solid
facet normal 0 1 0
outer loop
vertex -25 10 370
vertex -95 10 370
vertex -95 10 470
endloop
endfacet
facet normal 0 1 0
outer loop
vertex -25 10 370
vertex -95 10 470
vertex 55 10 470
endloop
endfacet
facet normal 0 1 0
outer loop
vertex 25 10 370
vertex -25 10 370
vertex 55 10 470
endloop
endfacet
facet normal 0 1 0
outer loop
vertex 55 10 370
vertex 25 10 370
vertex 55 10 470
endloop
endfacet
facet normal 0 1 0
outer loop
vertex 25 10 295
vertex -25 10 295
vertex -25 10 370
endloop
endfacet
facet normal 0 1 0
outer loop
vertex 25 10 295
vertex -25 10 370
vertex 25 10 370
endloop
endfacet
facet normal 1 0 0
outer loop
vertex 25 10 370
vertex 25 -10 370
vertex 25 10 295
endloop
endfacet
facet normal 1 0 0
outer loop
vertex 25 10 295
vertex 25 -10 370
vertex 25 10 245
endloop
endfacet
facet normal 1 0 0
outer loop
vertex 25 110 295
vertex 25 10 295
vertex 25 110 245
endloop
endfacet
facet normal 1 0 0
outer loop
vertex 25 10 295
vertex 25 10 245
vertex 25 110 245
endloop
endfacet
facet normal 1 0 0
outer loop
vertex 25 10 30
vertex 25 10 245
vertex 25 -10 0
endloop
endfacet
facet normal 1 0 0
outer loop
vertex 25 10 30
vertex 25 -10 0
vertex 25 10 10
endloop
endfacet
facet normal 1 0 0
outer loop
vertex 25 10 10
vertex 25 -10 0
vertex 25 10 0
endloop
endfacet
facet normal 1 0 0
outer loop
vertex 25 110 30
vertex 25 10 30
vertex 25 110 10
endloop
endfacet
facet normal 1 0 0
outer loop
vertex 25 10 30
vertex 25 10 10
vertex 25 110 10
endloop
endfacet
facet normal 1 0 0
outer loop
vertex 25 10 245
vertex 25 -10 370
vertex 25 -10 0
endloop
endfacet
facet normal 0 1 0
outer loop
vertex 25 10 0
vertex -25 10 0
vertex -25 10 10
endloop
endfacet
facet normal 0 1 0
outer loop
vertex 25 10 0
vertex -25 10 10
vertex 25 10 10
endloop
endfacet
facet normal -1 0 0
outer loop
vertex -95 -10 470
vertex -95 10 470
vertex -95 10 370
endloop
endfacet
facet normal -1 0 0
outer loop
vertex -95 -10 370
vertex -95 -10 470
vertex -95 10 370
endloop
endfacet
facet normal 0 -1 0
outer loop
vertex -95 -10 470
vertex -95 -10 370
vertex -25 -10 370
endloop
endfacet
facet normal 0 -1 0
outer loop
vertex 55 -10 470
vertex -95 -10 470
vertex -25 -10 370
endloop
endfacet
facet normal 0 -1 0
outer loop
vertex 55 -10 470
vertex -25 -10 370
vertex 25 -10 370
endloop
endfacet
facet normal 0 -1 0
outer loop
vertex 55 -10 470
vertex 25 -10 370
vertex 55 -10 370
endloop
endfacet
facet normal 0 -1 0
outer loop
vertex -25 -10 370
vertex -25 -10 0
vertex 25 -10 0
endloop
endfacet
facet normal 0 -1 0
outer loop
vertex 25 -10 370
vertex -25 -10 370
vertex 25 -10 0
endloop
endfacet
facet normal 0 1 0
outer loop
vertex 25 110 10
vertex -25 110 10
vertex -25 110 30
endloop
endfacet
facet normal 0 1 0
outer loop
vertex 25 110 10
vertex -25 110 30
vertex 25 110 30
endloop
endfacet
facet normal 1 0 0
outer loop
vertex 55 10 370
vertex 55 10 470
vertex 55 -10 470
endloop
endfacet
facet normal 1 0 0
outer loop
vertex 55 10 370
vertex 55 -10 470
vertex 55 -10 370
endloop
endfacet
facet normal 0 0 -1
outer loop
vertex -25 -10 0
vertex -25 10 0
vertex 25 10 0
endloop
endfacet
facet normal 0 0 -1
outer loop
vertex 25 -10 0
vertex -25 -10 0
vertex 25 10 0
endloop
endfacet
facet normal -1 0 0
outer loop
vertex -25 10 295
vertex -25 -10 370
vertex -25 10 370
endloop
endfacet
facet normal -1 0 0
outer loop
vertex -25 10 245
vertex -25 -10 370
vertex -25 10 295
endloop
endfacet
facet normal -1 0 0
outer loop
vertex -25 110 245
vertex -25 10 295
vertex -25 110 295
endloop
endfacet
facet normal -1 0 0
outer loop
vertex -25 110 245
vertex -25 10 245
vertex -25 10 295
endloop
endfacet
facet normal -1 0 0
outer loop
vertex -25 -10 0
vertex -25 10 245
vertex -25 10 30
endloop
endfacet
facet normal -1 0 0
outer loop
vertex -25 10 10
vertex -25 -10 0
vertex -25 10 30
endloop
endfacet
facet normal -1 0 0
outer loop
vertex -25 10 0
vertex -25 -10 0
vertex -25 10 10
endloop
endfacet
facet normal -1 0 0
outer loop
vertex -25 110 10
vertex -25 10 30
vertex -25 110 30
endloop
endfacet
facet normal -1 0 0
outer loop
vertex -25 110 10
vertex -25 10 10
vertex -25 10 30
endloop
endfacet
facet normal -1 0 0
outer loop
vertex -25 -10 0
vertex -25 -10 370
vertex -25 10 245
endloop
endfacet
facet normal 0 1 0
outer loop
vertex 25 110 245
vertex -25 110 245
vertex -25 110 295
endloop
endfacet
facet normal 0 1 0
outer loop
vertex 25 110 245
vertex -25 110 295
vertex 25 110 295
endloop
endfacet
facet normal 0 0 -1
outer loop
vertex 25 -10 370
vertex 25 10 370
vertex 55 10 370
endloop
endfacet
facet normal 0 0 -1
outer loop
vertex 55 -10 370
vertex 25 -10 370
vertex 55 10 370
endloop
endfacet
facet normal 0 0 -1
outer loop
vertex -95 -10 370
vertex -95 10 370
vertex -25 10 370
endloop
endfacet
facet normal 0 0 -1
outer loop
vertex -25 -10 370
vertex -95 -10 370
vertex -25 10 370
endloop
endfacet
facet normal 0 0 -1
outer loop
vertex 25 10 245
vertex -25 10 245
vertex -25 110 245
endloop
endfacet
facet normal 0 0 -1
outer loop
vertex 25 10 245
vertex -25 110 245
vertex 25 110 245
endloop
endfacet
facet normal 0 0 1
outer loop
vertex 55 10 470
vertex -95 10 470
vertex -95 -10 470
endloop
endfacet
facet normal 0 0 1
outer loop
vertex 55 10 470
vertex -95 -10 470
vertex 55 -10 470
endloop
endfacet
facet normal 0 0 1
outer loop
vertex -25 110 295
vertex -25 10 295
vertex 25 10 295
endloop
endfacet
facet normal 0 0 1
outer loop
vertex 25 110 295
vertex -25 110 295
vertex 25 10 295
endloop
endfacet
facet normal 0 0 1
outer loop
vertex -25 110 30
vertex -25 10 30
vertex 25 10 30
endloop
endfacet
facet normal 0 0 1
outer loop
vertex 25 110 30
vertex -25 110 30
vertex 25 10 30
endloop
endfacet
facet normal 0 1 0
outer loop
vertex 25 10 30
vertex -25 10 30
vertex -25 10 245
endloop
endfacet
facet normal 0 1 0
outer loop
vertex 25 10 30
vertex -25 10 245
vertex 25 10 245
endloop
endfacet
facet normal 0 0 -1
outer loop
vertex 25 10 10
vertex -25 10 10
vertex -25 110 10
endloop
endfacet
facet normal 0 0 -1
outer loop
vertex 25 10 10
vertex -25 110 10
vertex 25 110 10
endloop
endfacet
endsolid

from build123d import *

# Parameters (mm, degrees)
SKETCH1_W           = 50
SKETCH1_H           = 20
BOSS_EXTRUDE1_DEPTH = 470
SKETCH2_W           = 150
SKETCH2_H           = 100
BOSS_EXTRUDE2_DEPTH = 20
SKETCH3_W           = 50
SKETCH3_H           = 20
SKETCH3_H_2         = 50
BOSS_EXTRUDE3_DEPTH = 100


with BuildPart() as part:
    # Sketch1 → Boss-Extrude1 (new body)
    with BuildSketch(Plane.XY):
        Rectangle(SKETCH1_W, SKETCH1_H)
    extrude(amount=BOSS_EXTRUDE1_DEPTH)

    # Sketch2 → Boss-Extrude2 (add)
    with BuildSketch(Plane(origin=(0, 10, 0), x_dir=(1, 0, 0), z_dir=(0, 1, 0))):
        with Locations((-20, -420)):
            Rectangle(SKETCH2_W, SKETCH2_H)
    extrude(amount=-BOSS_EXTRUDE2_DEPTH)

    # Sketch3 → Boss-Extrude3 (add)
    with BuildSketch(Plane(origin=(0, 10, 0), x_dir=(1, 0, 0), z_dir=(0, 1, 0))):
        with Locations((0, -20)):
            Rectangle(SKETCH3_W, SKETCH3_H)
        with Locations((0, -270)):
            Rectangle(SKETCH3_W, SKETCH3_H_2)
    extrude(amount=BOSS_EXTRUDE3_DEPTH)


solid = part.part
